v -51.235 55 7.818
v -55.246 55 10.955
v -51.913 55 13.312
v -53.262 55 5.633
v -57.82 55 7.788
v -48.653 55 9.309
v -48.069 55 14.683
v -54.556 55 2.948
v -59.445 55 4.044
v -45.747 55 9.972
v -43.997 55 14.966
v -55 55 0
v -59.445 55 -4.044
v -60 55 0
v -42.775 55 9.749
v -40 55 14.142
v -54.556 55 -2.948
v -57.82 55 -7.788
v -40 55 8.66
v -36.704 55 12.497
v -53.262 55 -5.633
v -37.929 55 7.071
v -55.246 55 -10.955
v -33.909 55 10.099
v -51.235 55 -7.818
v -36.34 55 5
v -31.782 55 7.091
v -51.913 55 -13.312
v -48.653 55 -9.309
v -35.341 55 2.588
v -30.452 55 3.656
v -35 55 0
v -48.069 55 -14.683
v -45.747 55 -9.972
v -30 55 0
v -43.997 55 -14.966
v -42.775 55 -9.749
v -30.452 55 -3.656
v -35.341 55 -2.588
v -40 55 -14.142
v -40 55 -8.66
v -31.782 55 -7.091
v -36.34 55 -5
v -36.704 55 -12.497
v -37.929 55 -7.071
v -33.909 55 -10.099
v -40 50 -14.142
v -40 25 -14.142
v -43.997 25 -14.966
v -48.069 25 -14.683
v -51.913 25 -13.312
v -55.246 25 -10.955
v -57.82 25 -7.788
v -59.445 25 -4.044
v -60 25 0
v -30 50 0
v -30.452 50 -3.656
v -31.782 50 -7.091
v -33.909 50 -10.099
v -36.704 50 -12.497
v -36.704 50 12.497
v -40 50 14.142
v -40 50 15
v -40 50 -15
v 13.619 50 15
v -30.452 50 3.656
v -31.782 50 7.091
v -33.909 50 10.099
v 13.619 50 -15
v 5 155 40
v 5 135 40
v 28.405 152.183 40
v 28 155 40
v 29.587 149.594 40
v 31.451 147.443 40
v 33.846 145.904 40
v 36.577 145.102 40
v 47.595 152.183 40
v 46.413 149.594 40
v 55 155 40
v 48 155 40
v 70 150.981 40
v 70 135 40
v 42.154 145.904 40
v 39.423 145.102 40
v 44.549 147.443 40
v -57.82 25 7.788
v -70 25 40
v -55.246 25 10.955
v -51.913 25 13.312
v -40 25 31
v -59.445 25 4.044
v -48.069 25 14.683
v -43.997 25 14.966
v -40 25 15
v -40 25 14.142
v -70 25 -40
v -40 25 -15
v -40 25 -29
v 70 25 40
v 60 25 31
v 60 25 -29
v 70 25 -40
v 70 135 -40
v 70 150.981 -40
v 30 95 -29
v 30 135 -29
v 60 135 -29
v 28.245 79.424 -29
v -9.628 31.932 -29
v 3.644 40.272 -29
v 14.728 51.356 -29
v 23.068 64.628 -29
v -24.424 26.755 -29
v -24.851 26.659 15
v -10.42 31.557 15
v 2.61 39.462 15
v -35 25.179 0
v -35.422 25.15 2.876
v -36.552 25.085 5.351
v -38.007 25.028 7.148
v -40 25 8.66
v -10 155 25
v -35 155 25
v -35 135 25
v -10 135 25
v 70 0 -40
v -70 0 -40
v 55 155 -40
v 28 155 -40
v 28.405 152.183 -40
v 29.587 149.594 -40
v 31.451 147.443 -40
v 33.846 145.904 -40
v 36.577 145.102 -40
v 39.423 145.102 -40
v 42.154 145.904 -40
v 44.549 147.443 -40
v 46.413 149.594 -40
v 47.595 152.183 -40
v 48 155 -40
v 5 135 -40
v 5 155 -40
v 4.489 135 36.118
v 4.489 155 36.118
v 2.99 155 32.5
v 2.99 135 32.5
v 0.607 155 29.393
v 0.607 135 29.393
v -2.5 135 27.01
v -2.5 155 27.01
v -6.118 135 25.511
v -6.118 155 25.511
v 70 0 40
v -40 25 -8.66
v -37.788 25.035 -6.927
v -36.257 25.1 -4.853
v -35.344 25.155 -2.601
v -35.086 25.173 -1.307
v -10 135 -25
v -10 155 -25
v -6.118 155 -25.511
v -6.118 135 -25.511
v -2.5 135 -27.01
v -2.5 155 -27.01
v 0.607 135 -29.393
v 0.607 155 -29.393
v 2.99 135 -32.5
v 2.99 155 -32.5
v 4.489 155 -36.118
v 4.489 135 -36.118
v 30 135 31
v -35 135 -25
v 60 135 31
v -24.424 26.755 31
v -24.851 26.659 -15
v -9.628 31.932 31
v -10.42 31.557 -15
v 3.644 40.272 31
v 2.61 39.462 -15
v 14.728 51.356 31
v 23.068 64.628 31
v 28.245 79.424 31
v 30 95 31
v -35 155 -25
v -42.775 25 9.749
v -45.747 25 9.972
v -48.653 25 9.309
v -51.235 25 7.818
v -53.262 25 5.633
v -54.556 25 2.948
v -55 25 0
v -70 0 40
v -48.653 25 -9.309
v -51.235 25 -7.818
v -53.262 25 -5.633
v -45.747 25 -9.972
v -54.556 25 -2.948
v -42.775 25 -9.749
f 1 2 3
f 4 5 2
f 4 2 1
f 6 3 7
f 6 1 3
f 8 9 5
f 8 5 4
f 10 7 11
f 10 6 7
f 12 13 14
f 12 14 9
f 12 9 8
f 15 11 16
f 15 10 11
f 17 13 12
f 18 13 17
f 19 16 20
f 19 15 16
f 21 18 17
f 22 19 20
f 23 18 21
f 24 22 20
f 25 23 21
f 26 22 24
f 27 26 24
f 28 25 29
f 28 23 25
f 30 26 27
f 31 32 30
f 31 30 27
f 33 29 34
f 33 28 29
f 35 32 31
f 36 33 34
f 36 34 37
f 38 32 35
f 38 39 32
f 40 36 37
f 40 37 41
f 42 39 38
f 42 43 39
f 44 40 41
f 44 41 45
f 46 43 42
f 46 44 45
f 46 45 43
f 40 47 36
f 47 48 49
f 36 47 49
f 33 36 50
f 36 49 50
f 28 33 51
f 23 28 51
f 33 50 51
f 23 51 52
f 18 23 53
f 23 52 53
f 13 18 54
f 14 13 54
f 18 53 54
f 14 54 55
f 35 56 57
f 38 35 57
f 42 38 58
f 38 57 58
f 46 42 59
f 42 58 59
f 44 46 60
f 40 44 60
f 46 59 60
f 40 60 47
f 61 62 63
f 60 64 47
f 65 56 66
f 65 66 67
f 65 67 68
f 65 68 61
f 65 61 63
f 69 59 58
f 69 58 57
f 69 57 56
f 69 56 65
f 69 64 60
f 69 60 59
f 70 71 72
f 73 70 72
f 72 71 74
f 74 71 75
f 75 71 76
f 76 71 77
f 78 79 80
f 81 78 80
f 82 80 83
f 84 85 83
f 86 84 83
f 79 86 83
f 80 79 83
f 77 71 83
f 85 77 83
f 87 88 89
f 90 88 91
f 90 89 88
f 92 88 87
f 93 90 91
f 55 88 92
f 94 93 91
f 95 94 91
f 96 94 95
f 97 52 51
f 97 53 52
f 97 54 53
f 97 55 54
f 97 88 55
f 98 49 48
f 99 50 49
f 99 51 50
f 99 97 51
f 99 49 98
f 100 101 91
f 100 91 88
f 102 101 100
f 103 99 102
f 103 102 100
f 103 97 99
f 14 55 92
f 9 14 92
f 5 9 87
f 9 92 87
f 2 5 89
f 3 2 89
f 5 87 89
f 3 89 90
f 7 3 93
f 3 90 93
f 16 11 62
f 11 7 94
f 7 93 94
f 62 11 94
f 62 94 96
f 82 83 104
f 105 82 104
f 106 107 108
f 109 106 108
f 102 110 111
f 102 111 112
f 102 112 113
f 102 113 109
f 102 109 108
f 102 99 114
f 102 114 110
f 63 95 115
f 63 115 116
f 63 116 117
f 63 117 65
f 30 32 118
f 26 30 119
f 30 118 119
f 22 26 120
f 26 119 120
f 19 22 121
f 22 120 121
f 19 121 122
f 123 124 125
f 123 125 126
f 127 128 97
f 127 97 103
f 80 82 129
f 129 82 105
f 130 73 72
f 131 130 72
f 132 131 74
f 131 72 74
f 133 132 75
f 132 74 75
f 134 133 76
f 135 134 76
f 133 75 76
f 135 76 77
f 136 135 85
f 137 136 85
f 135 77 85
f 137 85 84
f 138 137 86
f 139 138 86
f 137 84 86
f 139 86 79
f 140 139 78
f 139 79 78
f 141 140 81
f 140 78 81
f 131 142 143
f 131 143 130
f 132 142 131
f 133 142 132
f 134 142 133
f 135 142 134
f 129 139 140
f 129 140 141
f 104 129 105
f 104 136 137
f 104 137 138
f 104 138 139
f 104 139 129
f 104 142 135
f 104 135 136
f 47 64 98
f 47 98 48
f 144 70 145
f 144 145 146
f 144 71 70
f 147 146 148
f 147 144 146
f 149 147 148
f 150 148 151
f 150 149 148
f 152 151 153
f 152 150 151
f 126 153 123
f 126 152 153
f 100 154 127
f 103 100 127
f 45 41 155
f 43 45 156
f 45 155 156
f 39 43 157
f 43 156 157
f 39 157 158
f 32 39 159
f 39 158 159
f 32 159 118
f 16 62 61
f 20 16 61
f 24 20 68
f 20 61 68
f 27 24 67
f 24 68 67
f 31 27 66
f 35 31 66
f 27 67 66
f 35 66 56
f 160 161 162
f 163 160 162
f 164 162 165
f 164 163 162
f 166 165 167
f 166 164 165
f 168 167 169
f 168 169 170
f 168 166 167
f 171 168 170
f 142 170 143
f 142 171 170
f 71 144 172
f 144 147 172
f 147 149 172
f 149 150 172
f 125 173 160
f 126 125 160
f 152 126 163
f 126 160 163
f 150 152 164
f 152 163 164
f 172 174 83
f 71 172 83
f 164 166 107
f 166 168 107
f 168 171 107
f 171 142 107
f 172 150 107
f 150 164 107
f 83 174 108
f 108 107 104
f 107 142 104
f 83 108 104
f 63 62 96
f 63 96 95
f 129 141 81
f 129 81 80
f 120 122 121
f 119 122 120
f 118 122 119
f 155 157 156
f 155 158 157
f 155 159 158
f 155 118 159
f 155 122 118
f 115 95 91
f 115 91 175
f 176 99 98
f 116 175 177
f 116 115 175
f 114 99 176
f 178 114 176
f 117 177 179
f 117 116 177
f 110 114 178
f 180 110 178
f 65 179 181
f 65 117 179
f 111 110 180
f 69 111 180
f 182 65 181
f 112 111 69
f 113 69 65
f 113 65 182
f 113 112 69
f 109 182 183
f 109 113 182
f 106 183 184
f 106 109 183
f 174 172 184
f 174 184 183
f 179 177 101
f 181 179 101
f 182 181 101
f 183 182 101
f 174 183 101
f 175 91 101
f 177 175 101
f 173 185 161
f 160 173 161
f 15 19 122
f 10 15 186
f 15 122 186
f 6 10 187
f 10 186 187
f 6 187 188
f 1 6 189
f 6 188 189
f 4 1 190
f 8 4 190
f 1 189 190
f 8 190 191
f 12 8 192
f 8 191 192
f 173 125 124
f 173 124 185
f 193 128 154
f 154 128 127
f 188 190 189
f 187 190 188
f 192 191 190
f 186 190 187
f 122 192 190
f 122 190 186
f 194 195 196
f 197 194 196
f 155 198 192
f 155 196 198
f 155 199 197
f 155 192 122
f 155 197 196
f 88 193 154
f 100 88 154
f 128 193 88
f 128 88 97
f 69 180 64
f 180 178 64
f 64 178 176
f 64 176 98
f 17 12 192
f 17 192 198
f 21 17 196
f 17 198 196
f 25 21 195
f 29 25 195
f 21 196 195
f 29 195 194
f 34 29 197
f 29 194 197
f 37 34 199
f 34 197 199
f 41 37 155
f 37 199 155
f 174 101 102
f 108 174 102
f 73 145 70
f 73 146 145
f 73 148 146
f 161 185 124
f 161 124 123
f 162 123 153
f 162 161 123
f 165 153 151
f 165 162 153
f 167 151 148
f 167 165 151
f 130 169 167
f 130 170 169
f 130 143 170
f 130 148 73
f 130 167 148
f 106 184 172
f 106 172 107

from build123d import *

# Parameters (mm, degrees)
SKETCH1_W           = 140
SKETCH1_H           = 80
BOSS_EXTRUDE1_DEPTH = 25
SKETCH2_W           = 30
SKETCH2_H           = 60
BOSS_EXTRUDE2_DEPTH = 110
FILLET1_R           = 70
BOSS_EXTRUDE4_DEPTH = 30
SKETCH6_W           = 105
SKETCH6_H           = 80
BOSS_EXTRUDE5_DEPTH = 20
CUT_EXTRUDE1_DEPTH  = 188.949461292
CHAMFER1_SIZE       = 15
CHAMFER1_SIZE2      = 4.019237886
BOSS_EXTRUDE8_DEPTH = 25
SKETCH14_W          = 40
SKETCH14_H          = 15
CUT_EXTRUDE4_DEPTH  = 20
FILLET2_R           = 15


with BuildPart() as part:
    # Sketch1 → Boss-Extrude1 (new body)
    with BuildSketch(Plane(origin=(0, 0, 0), x_dir=(1, 0, 0), z_dir=(0, 1, 0))):
        Rectangle(SKETCH1_W, SKETCH1_H)
    extrude(amount=BOSS_EXTRUDE1_DEPTH)

    # Sketch2 → Boss-Extrude2 (add)
    with BuildSketch(Plane(origin=(0, 25, 0), x_dir=(1, 0, 0), z_dir=(0, 1, 0))):
        with Locations((45, -1.000466796)):
            Rectangle(SKETCH2_W, SKETCH2_H)
    extrude(amount=BOSS_EXTRUDE2_DEPTH)

    # Fillet1
    fillet1_edges = [part.edges().sort_by_distance(p)[0] for p in [
        (30, 25, 1.000466796),
    ]]
    fillet(fillet1_edges, radius=FILLET1_R)

    # Sketch4 → Boss-Extrude4 (add)
    with BuildSketch(Plane(origin=(0, 25, 0), x_dir=(1, 0, 0), z_dir=(0, 1, 0))):
        with BuildLine():
            ThreePointArc((-40, 14.142135624), (-53.660254038, 12.247448714), (-60, 0))
            Line((-60, 0), (-55, 0))
            ThreePointArc((-55, 0), (-50, 8.660254038), (-40, 8.660254038))
            Line((-40, 8.660254038), (-40, 14.142135624))
        make_face()
        with BuildLine():
            Line((-55, 0), (-60, 0))
            ThreePointArc((-60, 0), (-53.660254038, -12.247448714), (-40, -14.142135624))
            Line((-40, -14.142135624), (-40, -8.660254038))
            ThreePointArc((-40, -8.660254038), (-50, -8.660254038), (-55, 0))
        make_face()
        with BuildLine():
            ThreePointArc((-30, 0), (-32.752551286, 8.660254038), (-40, 14.142135624))
            Line((-40, 14.142135624), (-40, 8.660254038))
            ThreePointArc((-40, 8.660254038), (-36.339745962, 5), (-35, 0))
            ThreePointArc((-35, 0), (-36.339745962, -5), (-40, -8.660254038))
            Line((-40, -8.660254038), (-40, -14.142135624))
            ThreePointArc((-40, -14.142135624), (-32.752551286, -8.660254038), (-30, 0))
        make_face()
    extrude(amount=BOSS_EXTRUDE4_DEPTH)

    # Sketch6 → Boss-Extrude5 (add)
    with BuildSketch(Plane(origin=(0, 135, 0), x_dir=(1, 0, 0), z_dir=(0, 1, 0))):
        with Locations((17.5, 0)):
            Rectangle(SKETCH6_W, SKETCH6_H)
    extrude(amount=BOSS_EXTRUDE5_DEPTH)

    # Sketch7 → Cut-Extrude1 (cut, through all)
    with BuildSketch(Plane.XY.offset(40)):
        with BuildLine():
            ThreePointArc((48, 155), (38, 165), (28, 155))
            Line((28, 155), (38, 155))
            Line((38, 155), (48, 155))
        make_face()
        with BuildLine():
            Line((38, 155), (28, 155))
            ThreePointArc((28, 155), (38, 145), (48, 155))
            Line((48, 155), (38, 155))
        make_face()
    extrude(amount=-CUT_EXTRUDE1_DEPTH, mode=Mode.SUBTRACT)

    # Chamfer1
    chamfer1_edges = [part.edges().sort_by_distance(p)[0] for p in [
        (70, 155, 0),
    ]]
    chamfer1_side = [part.faces().sort_by_distance(p)[0] for p in [
        (59, 155, 0),
    ]]
    chamfer(chamfer1_edges, length=CHAMFER1_SIZE, length2=CHAMFER1_SIZE2, reference=chamfer1_side[0])

    # Sketch13 → Boss-Extrude8 (add)
    with BuildSketch(Plane(origin=(0, 25, 0), x_dir=(1, 0, 0), z_dir=(0, 1, 0))):
        with BuildLine():
            Line((-40, -14.142135624), (-40, -15))
            Line((-40, -15), (16, -15))
            Line((16, -15), (16, 15))
            Line((16, 15), (-40, 15))
            Line((-40, 15), (-40, 14.142135624))
            ThreePointArc((-40, 14.142135624), (-32.752551286, 8.660254038), (-30, 0))
            ThreePointArc((-30, 0), (-32.752551286, -8.660254038), (-40, -14.142135624))
        make_face()
    extrude(amount=BOSS_EXTRUDE8_DEPTH)

    # Sketch14 → Cut-Extrude4 (cut)
    with BuildSketch(Plane(origin=(0, 155, 0), x_dir=(1, 0, 0), z_dir=(0, 1, 0))):
        with Locations((-15, 32.5)):
            Rectangle(SKETCH14_W, SKETCH14_H)
        with Locations((-15, -32.5)):
            Rectangle(SKETCH14_W, SKETCH14_H)
    extrude(amount=-CUT_EXTRUDE4_DEPTH, mode=Mode.SUBTRACT)

    # Fillet2
    fillet2_edges = [part.edges().sort_by_distance(p)[0] for p in [
        (5, 145, -25),
        (5, 145, 25),
    ]]
    fillet(fillet2_edges, radius=FILLET2_R - 0.0001)  # a hair under: the kernel refuses the full size


solid = part.part
